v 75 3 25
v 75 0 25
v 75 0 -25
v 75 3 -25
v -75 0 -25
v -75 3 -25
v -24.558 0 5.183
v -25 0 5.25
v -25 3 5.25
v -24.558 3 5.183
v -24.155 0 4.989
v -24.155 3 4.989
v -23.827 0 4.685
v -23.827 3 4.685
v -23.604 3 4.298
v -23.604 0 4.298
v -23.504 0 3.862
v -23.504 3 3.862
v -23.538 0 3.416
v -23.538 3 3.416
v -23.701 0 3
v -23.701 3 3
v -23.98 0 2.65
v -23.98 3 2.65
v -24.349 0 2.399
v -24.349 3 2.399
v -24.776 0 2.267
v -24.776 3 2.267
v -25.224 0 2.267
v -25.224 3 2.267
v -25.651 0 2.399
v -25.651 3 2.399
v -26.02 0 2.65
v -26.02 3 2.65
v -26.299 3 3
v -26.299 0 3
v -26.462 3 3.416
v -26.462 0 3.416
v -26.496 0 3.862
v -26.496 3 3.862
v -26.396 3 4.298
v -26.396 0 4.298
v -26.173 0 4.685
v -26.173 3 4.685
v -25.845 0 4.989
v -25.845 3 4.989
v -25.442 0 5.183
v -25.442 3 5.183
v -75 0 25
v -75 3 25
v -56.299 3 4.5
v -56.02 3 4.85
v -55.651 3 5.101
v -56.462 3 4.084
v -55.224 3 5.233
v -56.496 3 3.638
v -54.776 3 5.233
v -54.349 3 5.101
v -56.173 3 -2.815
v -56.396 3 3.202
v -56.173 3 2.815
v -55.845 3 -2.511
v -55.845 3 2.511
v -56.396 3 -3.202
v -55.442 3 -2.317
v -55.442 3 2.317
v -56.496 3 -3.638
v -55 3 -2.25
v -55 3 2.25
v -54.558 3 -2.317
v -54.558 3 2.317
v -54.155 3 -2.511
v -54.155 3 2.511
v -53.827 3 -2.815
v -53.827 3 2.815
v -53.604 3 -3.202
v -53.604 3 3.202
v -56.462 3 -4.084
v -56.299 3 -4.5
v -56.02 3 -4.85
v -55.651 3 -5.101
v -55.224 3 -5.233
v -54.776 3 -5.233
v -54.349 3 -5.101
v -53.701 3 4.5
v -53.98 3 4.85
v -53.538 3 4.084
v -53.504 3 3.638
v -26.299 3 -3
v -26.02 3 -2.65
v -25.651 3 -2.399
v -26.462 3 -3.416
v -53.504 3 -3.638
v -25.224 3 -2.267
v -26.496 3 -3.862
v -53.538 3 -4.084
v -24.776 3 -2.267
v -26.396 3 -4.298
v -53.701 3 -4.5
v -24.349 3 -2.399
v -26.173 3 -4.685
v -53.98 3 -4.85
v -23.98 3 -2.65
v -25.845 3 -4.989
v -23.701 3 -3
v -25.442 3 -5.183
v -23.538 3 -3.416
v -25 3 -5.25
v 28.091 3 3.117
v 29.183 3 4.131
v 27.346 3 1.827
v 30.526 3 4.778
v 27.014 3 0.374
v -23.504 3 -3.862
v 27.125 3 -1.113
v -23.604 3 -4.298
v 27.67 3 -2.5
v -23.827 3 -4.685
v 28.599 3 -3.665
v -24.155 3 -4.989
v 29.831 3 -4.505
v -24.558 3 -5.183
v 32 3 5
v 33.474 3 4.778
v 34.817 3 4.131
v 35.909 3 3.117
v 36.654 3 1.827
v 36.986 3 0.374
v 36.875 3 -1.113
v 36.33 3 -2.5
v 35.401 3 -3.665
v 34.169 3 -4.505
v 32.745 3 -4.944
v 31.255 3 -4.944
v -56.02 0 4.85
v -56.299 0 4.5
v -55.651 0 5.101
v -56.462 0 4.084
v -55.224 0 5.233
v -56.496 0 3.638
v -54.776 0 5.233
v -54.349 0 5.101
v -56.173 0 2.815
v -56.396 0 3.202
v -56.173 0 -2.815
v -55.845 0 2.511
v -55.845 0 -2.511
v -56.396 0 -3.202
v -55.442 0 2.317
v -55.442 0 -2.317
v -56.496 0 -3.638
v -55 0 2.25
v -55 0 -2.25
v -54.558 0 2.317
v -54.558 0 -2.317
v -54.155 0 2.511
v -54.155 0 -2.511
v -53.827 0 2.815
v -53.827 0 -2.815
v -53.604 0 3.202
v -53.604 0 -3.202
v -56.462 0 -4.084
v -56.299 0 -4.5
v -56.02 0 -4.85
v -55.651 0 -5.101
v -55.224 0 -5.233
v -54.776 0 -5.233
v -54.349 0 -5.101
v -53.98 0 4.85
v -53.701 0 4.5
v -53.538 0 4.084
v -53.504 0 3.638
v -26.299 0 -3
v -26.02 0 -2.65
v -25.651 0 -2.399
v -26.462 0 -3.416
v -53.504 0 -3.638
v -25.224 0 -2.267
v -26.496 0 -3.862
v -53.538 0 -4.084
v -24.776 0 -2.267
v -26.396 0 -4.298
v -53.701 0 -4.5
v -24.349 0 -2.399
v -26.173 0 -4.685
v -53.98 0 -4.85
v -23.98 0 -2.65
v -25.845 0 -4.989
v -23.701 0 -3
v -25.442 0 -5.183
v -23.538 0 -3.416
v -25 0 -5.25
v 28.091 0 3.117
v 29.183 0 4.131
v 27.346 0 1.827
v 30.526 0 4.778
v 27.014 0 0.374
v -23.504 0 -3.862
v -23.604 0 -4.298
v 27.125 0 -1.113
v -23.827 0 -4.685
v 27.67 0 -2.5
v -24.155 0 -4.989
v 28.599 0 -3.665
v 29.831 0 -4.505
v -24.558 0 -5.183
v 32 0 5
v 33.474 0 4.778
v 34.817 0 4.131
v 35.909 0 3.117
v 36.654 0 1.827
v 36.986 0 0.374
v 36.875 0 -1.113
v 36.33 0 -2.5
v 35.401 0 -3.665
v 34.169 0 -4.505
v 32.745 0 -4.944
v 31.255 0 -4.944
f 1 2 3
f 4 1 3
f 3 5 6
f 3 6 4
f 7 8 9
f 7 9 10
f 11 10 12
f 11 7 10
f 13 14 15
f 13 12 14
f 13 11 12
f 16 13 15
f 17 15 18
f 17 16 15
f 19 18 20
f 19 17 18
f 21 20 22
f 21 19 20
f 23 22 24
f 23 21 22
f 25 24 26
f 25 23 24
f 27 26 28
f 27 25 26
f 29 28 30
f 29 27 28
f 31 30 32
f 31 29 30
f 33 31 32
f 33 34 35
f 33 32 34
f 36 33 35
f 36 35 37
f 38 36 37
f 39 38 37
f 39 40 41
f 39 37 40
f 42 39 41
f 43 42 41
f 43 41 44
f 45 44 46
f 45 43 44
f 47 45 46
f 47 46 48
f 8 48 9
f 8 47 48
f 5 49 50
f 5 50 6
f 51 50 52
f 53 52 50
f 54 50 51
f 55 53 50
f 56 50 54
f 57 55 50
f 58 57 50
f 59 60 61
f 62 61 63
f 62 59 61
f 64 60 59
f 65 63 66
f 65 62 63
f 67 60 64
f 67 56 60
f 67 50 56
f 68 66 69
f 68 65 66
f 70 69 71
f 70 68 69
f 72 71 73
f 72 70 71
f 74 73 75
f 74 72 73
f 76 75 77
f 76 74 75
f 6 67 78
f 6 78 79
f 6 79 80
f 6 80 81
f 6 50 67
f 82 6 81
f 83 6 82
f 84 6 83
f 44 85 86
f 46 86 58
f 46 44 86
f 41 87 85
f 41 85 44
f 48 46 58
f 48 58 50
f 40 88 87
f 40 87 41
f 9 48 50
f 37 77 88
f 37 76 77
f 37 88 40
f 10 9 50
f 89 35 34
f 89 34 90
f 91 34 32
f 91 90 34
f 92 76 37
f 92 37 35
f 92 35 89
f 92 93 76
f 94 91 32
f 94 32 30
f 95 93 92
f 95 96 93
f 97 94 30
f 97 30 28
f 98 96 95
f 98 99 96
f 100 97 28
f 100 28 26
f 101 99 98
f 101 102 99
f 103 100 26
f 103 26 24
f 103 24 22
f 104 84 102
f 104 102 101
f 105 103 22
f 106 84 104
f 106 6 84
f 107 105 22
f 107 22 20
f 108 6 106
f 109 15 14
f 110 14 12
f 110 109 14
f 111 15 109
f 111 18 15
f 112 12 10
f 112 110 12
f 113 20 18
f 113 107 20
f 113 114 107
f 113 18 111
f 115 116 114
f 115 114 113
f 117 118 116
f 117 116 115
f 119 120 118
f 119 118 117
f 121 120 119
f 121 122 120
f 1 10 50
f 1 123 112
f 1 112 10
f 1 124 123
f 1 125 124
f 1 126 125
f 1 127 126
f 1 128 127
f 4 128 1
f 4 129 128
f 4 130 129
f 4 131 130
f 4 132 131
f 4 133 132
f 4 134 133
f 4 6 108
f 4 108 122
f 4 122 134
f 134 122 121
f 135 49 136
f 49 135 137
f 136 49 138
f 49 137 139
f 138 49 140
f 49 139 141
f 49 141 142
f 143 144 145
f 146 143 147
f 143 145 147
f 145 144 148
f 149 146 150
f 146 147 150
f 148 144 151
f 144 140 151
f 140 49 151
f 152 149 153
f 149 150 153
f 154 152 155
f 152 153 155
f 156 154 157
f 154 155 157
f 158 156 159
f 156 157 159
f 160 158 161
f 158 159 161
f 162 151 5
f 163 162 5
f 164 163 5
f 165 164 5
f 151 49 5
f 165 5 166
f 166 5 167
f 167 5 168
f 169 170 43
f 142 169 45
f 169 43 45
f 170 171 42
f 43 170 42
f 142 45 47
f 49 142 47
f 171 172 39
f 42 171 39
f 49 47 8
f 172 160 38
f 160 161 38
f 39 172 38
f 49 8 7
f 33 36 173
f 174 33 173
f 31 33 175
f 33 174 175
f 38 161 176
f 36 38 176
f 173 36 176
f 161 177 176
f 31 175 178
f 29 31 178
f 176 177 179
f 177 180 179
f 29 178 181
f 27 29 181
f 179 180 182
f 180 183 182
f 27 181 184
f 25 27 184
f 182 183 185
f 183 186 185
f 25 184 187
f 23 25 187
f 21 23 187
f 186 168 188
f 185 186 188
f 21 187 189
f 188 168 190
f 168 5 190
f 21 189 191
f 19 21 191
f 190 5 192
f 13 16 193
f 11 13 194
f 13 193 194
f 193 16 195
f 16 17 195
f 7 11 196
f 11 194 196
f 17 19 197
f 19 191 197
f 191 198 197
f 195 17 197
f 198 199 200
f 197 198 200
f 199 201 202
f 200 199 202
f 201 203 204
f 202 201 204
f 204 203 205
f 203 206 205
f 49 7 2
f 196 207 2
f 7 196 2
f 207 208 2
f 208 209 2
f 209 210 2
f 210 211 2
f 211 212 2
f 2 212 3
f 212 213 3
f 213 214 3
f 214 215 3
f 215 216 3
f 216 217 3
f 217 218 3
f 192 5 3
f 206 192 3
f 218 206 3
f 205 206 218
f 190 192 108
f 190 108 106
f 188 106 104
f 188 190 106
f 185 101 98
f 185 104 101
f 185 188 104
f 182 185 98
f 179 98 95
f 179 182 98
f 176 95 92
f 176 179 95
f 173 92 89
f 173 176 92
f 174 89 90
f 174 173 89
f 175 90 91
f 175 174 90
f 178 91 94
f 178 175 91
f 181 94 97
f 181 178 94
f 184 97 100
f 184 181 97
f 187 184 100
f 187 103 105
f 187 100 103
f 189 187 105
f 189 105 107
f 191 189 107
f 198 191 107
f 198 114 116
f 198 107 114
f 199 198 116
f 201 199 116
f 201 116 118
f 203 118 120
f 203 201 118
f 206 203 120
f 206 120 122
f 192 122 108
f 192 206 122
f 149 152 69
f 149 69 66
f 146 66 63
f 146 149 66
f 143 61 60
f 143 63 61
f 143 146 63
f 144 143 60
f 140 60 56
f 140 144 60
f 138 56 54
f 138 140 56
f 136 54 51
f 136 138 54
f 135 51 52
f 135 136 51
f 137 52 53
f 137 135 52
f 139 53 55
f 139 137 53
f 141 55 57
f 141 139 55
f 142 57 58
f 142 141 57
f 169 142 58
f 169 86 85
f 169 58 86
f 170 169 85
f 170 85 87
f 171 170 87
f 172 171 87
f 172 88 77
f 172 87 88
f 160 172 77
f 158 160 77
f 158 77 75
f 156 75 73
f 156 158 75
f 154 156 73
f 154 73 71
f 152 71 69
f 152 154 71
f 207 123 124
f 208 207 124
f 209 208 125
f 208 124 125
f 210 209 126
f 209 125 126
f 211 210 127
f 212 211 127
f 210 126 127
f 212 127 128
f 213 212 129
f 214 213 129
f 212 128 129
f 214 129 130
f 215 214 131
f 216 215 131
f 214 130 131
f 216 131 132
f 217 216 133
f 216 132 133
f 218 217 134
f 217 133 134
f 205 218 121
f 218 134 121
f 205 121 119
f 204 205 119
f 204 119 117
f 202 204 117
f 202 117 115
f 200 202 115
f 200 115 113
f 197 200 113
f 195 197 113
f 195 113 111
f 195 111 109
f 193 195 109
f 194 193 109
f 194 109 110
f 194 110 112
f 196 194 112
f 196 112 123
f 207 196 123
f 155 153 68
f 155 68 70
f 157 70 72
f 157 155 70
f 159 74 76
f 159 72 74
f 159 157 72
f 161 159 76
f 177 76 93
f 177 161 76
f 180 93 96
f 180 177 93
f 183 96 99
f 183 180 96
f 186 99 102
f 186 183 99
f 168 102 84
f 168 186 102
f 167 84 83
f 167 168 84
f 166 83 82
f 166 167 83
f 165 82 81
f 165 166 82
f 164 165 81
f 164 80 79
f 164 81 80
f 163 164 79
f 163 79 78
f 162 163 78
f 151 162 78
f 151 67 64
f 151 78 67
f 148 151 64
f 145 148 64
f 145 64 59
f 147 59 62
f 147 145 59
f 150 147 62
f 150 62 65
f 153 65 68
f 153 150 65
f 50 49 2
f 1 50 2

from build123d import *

# Parameters (mm, degrees)
SKETCH1_W               = 150
SKETCH1_H               = 50
BOSS_EXTRUDE1_DEPTH     = 3
CUT_EXTRUDE1_DEPTH      = 80.113842025
CUT_EXTRUDE1_DEPTH_BACK = 80.113842025
SKETCH2_R               = 1.5
SKETCH3_R               = 5
CUT_EXTRUDE2_DEPTH      = 80.113842025


with BuildPart() as part:
    # Sketch1 → Boss-Extrude1 (new body)
    with BuildSketch(Plane(origin=(0, 0, 0), x_dir=(1, 0, 0), z_dir=(0, 1, 0))):
        Rectangle(SKETCH1_W, SKETCH1_H)
    extrude(amount=BOSS_EXTRUDE1_DEPTH)

    # Sketch2 → Cut-Extrude1 (cut, two sides: drawn at the far end of the back side and taken through both)
    with BuildSketch(Plane(origin=(0, 3, 0), x_dir=(1, 0, 0), z_dir=(0, 1, 0)).offset(-CUT_EXTRUDE1_DEPTH_BACK)):
        with Locations(Location((-55, 3.75, 0), (0, 0, 270))):
            Circle(SKETCH2_R)
        with Locations(Location((-55, -3.75, 0), (0, 0, 90))):
            Circle(SKETCH2_R)
        with Locations(Location((-25, -3.75, 0), (0, 0, 270))):
            Circle(SKETCH2_R)
        with Locations(Location((-25, 3.75, 0), (0, 0, 90))):
            Circle(SKETCH2_R)
    extrude(amount=CUT_EXTRUDE1_DEPTH + CUT_EXTRUDE1_DEPTH_BACK, mode=Mode.SUBTRACT)

    # Sketch3 → Cut-Extrude2 (cut, through all)
    with BuildSketch(Plane(origin=(0, 3, 0), x_dir=(1, 0, 0), z_dir=(0, 1, 0))):
        with Locations(Location((32, 0, 0), (0, 0, 270))):
            Circle(SKETCH3_R)
    extrude(amount=-CUT_EXTRUDE2_DEPTH, mode=Mode.SUBTRACT)


solid = part.part
